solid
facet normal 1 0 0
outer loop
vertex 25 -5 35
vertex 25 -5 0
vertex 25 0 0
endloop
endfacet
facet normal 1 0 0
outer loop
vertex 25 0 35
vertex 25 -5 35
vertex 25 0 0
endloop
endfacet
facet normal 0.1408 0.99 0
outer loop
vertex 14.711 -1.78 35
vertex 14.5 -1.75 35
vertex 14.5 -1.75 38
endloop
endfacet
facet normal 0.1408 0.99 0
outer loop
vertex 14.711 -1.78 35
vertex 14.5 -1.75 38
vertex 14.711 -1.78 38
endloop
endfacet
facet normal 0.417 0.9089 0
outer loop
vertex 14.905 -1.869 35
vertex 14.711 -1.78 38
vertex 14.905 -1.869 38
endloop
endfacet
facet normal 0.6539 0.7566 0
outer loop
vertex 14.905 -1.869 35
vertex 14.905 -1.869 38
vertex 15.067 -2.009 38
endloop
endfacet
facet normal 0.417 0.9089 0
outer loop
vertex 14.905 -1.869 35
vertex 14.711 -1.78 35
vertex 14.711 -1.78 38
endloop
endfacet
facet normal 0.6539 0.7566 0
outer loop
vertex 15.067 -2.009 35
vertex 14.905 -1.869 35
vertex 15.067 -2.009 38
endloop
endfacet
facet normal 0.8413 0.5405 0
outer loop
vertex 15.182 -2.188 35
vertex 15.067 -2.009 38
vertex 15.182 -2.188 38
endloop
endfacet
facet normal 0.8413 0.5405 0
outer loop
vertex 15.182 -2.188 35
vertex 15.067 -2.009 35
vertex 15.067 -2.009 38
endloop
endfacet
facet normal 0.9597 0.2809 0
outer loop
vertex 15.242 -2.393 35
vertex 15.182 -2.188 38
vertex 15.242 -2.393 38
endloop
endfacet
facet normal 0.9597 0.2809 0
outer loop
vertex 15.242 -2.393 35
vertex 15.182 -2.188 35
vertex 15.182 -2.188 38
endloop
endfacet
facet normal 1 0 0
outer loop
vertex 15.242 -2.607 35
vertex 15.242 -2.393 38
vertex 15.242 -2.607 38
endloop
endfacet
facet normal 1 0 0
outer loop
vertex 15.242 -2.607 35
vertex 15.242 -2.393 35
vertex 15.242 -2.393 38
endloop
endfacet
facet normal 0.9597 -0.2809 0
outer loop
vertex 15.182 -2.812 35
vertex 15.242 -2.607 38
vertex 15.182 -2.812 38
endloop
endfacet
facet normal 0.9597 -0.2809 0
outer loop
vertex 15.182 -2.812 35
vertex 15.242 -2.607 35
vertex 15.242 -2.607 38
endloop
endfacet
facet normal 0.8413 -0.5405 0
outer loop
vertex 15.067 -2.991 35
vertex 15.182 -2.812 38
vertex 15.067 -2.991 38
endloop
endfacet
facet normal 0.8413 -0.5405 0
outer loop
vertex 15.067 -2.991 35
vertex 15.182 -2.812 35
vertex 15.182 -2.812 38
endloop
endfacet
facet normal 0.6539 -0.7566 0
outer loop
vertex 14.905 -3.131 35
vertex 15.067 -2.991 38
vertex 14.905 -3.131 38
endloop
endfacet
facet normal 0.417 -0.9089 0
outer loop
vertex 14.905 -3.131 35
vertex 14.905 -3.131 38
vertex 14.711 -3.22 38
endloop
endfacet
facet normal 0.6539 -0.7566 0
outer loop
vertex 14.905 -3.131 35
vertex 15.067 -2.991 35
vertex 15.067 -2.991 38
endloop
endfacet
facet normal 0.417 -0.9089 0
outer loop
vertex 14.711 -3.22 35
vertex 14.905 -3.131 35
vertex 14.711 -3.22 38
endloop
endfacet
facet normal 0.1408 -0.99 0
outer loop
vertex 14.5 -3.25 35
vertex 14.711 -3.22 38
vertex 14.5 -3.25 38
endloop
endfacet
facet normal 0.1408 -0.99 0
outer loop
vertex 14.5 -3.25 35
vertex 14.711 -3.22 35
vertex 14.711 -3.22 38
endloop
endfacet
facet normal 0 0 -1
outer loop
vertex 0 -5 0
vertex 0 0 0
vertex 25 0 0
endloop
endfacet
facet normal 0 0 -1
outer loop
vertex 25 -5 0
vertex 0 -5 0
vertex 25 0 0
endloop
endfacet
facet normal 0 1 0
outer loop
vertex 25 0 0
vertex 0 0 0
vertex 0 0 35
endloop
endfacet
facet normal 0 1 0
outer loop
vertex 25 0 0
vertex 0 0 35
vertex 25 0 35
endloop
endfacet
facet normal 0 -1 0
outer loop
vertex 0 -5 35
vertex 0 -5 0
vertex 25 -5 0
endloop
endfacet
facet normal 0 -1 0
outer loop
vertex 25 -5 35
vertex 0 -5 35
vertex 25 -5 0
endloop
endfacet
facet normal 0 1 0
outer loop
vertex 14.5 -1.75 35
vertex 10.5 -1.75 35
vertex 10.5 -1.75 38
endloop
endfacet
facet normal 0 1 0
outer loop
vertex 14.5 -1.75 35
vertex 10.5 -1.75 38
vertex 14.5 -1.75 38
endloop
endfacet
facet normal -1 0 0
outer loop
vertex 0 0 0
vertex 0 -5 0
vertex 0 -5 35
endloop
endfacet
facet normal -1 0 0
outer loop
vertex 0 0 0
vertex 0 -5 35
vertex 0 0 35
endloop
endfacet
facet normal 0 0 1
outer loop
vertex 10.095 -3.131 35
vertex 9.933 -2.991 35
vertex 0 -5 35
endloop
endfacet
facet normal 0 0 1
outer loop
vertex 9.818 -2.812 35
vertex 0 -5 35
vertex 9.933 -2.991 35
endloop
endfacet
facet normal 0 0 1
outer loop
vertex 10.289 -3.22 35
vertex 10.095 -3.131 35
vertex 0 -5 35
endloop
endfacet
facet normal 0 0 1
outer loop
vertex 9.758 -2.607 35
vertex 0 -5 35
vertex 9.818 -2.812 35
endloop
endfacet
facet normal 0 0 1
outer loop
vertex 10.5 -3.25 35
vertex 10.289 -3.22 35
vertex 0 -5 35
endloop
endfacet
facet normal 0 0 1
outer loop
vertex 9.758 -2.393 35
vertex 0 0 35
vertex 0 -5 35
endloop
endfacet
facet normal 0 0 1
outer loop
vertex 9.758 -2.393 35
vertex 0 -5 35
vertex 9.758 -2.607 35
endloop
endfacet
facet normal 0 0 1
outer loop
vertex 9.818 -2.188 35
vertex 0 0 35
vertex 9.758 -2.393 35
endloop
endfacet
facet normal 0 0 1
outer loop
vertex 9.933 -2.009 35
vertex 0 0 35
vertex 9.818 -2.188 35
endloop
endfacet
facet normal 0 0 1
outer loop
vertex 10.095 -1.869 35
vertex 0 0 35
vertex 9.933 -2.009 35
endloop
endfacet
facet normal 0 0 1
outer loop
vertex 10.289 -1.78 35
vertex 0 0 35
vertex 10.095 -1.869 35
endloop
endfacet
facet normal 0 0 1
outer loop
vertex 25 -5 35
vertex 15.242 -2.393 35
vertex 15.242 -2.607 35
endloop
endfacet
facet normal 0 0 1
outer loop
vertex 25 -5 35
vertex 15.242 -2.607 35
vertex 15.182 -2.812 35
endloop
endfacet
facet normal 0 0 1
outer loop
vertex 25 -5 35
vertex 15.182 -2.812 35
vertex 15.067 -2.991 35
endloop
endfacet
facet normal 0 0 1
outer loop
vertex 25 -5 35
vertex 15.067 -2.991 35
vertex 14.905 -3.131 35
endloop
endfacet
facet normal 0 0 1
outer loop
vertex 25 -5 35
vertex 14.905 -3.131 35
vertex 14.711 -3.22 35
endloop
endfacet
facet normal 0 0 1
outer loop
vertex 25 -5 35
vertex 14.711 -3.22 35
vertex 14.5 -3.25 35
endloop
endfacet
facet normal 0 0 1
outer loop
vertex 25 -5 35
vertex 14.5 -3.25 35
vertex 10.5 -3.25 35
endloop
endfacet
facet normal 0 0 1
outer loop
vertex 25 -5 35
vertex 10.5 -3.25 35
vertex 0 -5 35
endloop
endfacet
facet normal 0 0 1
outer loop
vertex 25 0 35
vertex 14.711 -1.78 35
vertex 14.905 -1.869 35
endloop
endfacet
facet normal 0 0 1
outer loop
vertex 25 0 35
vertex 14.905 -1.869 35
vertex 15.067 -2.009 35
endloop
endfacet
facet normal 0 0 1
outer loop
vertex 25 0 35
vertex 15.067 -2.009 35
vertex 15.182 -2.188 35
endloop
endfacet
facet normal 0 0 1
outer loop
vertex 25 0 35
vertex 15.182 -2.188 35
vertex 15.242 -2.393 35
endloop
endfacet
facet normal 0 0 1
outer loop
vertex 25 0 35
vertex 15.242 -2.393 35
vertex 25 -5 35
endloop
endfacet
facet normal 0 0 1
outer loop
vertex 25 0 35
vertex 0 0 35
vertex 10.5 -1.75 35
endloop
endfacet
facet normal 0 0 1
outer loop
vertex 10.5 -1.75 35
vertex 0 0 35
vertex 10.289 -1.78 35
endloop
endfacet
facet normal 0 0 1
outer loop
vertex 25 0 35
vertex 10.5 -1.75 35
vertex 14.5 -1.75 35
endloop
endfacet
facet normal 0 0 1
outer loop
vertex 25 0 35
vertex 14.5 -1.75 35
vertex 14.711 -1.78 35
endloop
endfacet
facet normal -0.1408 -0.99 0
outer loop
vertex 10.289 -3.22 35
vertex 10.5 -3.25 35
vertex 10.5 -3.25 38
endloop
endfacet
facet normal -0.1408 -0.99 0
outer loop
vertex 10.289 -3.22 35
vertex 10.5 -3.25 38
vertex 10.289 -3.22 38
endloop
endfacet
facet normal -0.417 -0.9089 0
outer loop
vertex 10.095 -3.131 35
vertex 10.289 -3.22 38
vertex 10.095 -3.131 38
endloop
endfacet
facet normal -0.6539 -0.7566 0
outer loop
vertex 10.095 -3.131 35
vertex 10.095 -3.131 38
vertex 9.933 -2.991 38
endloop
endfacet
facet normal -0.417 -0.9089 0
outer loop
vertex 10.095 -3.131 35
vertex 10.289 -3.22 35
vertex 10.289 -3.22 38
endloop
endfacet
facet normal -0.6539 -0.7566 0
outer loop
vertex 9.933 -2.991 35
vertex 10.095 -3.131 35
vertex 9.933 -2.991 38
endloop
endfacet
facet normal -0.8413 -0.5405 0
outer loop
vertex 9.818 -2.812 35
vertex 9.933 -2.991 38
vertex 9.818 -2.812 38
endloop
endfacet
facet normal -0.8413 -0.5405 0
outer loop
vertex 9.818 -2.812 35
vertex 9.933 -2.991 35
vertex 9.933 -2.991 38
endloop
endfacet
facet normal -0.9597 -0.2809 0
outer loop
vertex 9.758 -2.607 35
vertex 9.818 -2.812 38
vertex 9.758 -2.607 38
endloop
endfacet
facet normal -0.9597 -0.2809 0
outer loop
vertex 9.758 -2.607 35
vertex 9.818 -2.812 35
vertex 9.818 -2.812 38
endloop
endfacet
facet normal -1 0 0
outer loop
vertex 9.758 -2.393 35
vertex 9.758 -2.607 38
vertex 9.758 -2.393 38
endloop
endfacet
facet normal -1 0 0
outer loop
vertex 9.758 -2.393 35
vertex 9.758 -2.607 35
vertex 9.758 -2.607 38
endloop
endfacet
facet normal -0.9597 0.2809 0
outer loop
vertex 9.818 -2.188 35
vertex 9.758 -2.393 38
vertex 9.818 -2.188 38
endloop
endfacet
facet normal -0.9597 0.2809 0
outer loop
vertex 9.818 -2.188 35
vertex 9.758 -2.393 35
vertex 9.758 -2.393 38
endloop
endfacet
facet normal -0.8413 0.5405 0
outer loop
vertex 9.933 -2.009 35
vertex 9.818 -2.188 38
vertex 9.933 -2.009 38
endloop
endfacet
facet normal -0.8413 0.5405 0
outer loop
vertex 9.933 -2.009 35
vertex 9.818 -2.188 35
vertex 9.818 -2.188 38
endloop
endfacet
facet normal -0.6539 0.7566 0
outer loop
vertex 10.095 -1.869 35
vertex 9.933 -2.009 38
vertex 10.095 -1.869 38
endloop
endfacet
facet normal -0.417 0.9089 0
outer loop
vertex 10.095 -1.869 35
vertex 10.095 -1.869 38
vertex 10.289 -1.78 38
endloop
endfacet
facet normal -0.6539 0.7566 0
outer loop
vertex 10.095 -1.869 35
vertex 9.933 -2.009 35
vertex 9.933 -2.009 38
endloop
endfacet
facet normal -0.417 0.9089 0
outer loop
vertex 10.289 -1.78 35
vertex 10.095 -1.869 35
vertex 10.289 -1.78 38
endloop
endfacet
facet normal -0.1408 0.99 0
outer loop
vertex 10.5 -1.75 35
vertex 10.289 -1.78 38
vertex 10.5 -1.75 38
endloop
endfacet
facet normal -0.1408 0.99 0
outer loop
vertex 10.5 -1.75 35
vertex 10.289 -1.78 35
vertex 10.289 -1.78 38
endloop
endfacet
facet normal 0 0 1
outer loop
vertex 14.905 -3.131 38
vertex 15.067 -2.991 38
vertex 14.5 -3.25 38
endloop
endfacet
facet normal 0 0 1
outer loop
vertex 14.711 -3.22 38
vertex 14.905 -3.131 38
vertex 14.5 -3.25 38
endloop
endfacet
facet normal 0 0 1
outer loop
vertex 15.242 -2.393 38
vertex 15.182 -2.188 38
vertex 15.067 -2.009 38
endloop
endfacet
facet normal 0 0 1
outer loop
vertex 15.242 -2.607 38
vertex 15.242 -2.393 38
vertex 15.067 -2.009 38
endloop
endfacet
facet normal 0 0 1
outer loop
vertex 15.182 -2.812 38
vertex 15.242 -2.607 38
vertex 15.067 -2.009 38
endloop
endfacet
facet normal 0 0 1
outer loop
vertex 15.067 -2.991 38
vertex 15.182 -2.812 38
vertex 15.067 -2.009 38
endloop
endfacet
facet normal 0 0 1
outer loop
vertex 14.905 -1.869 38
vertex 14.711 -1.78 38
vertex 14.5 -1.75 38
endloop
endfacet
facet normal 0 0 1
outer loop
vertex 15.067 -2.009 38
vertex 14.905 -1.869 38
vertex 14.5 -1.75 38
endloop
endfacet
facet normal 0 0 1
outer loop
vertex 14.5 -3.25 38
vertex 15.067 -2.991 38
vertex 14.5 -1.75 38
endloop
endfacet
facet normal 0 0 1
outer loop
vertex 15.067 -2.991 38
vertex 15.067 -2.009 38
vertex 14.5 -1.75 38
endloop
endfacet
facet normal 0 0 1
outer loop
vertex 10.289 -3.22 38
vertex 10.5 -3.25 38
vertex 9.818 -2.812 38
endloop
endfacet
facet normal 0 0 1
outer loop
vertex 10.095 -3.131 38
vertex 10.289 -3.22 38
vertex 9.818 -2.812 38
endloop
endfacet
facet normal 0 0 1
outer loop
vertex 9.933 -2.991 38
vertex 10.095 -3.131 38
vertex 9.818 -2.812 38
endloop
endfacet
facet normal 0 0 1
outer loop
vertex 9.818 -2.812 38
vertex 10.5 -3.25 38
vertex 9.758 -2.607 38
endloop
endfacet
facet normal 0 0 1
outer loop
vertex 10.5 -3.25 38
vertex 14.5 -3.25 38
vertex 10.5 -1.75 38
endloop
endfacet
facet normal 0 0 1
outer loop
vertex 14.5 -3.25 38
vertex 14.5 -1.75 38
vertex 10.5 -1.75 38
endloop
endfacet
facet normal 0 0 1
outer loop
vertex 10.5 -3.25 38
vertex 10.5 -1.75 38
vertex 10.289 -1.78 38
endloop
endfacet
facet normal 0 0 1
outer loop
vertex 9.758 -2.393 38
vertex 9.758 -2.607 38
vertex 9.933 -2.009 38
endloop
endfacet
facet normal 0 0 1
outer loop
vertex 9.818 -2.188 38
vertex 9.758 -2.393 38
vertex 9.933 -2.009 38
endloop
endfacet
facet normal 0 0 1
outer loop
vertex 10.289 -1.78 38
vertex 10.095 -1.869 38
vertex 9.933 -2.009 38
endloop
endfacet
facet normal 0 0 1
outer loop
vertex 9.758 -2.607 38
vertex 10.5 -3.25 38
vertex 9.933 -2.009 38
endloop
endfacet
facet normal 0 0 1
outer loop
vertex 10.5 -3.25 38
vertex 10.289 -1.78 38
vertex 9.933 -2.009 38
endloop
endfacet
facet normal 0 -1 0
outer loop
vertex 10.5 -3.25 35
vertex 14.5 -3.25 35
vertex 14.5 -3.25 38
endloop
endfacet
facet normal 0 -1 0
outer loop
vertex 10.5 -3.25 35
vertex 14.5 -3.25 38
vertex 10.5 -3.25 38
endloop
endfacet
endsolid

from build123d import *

# Parameters (mm, degrees)
SKETCH1_W           = 25
SKETCH1_H           = 5
BOSS_EXTRUDE1_DEPTH = 35
BOSS_EXTRUDE2_DEPTH = 3


with BuildPart() as part:
    # Sketch1 → Boss-Extrude1 (new body)
    with BuildSketch(Plane.XY):
        with Locations((12.5, -2.5)):
            Rectangle(SKETCH1_W, SKETCH1_H)
    extrude(amount=BOSS_EXTRUDE1_DEPTH)

    # Sketch2 → Boss-Extrude2 (add)
    with BuildSketch(Plane.XY.offset(35)):
        with BuildLine():
            Line((10.5, -1.75), (14.5, -1.75))
            ThreePointArc((14.5, -1.75), (15.25, -2.5), (14.5, -3.25))
            Line((14.5, -3.25), (10.5, -3.25))
            ThreePointArc((10.5, -3.25), (9.75, -2.5), (10.5, -1.75))
        make_face()
    extrude(amount=BOSS_EXTRUDE2_DEPTH)


solid = part.part
